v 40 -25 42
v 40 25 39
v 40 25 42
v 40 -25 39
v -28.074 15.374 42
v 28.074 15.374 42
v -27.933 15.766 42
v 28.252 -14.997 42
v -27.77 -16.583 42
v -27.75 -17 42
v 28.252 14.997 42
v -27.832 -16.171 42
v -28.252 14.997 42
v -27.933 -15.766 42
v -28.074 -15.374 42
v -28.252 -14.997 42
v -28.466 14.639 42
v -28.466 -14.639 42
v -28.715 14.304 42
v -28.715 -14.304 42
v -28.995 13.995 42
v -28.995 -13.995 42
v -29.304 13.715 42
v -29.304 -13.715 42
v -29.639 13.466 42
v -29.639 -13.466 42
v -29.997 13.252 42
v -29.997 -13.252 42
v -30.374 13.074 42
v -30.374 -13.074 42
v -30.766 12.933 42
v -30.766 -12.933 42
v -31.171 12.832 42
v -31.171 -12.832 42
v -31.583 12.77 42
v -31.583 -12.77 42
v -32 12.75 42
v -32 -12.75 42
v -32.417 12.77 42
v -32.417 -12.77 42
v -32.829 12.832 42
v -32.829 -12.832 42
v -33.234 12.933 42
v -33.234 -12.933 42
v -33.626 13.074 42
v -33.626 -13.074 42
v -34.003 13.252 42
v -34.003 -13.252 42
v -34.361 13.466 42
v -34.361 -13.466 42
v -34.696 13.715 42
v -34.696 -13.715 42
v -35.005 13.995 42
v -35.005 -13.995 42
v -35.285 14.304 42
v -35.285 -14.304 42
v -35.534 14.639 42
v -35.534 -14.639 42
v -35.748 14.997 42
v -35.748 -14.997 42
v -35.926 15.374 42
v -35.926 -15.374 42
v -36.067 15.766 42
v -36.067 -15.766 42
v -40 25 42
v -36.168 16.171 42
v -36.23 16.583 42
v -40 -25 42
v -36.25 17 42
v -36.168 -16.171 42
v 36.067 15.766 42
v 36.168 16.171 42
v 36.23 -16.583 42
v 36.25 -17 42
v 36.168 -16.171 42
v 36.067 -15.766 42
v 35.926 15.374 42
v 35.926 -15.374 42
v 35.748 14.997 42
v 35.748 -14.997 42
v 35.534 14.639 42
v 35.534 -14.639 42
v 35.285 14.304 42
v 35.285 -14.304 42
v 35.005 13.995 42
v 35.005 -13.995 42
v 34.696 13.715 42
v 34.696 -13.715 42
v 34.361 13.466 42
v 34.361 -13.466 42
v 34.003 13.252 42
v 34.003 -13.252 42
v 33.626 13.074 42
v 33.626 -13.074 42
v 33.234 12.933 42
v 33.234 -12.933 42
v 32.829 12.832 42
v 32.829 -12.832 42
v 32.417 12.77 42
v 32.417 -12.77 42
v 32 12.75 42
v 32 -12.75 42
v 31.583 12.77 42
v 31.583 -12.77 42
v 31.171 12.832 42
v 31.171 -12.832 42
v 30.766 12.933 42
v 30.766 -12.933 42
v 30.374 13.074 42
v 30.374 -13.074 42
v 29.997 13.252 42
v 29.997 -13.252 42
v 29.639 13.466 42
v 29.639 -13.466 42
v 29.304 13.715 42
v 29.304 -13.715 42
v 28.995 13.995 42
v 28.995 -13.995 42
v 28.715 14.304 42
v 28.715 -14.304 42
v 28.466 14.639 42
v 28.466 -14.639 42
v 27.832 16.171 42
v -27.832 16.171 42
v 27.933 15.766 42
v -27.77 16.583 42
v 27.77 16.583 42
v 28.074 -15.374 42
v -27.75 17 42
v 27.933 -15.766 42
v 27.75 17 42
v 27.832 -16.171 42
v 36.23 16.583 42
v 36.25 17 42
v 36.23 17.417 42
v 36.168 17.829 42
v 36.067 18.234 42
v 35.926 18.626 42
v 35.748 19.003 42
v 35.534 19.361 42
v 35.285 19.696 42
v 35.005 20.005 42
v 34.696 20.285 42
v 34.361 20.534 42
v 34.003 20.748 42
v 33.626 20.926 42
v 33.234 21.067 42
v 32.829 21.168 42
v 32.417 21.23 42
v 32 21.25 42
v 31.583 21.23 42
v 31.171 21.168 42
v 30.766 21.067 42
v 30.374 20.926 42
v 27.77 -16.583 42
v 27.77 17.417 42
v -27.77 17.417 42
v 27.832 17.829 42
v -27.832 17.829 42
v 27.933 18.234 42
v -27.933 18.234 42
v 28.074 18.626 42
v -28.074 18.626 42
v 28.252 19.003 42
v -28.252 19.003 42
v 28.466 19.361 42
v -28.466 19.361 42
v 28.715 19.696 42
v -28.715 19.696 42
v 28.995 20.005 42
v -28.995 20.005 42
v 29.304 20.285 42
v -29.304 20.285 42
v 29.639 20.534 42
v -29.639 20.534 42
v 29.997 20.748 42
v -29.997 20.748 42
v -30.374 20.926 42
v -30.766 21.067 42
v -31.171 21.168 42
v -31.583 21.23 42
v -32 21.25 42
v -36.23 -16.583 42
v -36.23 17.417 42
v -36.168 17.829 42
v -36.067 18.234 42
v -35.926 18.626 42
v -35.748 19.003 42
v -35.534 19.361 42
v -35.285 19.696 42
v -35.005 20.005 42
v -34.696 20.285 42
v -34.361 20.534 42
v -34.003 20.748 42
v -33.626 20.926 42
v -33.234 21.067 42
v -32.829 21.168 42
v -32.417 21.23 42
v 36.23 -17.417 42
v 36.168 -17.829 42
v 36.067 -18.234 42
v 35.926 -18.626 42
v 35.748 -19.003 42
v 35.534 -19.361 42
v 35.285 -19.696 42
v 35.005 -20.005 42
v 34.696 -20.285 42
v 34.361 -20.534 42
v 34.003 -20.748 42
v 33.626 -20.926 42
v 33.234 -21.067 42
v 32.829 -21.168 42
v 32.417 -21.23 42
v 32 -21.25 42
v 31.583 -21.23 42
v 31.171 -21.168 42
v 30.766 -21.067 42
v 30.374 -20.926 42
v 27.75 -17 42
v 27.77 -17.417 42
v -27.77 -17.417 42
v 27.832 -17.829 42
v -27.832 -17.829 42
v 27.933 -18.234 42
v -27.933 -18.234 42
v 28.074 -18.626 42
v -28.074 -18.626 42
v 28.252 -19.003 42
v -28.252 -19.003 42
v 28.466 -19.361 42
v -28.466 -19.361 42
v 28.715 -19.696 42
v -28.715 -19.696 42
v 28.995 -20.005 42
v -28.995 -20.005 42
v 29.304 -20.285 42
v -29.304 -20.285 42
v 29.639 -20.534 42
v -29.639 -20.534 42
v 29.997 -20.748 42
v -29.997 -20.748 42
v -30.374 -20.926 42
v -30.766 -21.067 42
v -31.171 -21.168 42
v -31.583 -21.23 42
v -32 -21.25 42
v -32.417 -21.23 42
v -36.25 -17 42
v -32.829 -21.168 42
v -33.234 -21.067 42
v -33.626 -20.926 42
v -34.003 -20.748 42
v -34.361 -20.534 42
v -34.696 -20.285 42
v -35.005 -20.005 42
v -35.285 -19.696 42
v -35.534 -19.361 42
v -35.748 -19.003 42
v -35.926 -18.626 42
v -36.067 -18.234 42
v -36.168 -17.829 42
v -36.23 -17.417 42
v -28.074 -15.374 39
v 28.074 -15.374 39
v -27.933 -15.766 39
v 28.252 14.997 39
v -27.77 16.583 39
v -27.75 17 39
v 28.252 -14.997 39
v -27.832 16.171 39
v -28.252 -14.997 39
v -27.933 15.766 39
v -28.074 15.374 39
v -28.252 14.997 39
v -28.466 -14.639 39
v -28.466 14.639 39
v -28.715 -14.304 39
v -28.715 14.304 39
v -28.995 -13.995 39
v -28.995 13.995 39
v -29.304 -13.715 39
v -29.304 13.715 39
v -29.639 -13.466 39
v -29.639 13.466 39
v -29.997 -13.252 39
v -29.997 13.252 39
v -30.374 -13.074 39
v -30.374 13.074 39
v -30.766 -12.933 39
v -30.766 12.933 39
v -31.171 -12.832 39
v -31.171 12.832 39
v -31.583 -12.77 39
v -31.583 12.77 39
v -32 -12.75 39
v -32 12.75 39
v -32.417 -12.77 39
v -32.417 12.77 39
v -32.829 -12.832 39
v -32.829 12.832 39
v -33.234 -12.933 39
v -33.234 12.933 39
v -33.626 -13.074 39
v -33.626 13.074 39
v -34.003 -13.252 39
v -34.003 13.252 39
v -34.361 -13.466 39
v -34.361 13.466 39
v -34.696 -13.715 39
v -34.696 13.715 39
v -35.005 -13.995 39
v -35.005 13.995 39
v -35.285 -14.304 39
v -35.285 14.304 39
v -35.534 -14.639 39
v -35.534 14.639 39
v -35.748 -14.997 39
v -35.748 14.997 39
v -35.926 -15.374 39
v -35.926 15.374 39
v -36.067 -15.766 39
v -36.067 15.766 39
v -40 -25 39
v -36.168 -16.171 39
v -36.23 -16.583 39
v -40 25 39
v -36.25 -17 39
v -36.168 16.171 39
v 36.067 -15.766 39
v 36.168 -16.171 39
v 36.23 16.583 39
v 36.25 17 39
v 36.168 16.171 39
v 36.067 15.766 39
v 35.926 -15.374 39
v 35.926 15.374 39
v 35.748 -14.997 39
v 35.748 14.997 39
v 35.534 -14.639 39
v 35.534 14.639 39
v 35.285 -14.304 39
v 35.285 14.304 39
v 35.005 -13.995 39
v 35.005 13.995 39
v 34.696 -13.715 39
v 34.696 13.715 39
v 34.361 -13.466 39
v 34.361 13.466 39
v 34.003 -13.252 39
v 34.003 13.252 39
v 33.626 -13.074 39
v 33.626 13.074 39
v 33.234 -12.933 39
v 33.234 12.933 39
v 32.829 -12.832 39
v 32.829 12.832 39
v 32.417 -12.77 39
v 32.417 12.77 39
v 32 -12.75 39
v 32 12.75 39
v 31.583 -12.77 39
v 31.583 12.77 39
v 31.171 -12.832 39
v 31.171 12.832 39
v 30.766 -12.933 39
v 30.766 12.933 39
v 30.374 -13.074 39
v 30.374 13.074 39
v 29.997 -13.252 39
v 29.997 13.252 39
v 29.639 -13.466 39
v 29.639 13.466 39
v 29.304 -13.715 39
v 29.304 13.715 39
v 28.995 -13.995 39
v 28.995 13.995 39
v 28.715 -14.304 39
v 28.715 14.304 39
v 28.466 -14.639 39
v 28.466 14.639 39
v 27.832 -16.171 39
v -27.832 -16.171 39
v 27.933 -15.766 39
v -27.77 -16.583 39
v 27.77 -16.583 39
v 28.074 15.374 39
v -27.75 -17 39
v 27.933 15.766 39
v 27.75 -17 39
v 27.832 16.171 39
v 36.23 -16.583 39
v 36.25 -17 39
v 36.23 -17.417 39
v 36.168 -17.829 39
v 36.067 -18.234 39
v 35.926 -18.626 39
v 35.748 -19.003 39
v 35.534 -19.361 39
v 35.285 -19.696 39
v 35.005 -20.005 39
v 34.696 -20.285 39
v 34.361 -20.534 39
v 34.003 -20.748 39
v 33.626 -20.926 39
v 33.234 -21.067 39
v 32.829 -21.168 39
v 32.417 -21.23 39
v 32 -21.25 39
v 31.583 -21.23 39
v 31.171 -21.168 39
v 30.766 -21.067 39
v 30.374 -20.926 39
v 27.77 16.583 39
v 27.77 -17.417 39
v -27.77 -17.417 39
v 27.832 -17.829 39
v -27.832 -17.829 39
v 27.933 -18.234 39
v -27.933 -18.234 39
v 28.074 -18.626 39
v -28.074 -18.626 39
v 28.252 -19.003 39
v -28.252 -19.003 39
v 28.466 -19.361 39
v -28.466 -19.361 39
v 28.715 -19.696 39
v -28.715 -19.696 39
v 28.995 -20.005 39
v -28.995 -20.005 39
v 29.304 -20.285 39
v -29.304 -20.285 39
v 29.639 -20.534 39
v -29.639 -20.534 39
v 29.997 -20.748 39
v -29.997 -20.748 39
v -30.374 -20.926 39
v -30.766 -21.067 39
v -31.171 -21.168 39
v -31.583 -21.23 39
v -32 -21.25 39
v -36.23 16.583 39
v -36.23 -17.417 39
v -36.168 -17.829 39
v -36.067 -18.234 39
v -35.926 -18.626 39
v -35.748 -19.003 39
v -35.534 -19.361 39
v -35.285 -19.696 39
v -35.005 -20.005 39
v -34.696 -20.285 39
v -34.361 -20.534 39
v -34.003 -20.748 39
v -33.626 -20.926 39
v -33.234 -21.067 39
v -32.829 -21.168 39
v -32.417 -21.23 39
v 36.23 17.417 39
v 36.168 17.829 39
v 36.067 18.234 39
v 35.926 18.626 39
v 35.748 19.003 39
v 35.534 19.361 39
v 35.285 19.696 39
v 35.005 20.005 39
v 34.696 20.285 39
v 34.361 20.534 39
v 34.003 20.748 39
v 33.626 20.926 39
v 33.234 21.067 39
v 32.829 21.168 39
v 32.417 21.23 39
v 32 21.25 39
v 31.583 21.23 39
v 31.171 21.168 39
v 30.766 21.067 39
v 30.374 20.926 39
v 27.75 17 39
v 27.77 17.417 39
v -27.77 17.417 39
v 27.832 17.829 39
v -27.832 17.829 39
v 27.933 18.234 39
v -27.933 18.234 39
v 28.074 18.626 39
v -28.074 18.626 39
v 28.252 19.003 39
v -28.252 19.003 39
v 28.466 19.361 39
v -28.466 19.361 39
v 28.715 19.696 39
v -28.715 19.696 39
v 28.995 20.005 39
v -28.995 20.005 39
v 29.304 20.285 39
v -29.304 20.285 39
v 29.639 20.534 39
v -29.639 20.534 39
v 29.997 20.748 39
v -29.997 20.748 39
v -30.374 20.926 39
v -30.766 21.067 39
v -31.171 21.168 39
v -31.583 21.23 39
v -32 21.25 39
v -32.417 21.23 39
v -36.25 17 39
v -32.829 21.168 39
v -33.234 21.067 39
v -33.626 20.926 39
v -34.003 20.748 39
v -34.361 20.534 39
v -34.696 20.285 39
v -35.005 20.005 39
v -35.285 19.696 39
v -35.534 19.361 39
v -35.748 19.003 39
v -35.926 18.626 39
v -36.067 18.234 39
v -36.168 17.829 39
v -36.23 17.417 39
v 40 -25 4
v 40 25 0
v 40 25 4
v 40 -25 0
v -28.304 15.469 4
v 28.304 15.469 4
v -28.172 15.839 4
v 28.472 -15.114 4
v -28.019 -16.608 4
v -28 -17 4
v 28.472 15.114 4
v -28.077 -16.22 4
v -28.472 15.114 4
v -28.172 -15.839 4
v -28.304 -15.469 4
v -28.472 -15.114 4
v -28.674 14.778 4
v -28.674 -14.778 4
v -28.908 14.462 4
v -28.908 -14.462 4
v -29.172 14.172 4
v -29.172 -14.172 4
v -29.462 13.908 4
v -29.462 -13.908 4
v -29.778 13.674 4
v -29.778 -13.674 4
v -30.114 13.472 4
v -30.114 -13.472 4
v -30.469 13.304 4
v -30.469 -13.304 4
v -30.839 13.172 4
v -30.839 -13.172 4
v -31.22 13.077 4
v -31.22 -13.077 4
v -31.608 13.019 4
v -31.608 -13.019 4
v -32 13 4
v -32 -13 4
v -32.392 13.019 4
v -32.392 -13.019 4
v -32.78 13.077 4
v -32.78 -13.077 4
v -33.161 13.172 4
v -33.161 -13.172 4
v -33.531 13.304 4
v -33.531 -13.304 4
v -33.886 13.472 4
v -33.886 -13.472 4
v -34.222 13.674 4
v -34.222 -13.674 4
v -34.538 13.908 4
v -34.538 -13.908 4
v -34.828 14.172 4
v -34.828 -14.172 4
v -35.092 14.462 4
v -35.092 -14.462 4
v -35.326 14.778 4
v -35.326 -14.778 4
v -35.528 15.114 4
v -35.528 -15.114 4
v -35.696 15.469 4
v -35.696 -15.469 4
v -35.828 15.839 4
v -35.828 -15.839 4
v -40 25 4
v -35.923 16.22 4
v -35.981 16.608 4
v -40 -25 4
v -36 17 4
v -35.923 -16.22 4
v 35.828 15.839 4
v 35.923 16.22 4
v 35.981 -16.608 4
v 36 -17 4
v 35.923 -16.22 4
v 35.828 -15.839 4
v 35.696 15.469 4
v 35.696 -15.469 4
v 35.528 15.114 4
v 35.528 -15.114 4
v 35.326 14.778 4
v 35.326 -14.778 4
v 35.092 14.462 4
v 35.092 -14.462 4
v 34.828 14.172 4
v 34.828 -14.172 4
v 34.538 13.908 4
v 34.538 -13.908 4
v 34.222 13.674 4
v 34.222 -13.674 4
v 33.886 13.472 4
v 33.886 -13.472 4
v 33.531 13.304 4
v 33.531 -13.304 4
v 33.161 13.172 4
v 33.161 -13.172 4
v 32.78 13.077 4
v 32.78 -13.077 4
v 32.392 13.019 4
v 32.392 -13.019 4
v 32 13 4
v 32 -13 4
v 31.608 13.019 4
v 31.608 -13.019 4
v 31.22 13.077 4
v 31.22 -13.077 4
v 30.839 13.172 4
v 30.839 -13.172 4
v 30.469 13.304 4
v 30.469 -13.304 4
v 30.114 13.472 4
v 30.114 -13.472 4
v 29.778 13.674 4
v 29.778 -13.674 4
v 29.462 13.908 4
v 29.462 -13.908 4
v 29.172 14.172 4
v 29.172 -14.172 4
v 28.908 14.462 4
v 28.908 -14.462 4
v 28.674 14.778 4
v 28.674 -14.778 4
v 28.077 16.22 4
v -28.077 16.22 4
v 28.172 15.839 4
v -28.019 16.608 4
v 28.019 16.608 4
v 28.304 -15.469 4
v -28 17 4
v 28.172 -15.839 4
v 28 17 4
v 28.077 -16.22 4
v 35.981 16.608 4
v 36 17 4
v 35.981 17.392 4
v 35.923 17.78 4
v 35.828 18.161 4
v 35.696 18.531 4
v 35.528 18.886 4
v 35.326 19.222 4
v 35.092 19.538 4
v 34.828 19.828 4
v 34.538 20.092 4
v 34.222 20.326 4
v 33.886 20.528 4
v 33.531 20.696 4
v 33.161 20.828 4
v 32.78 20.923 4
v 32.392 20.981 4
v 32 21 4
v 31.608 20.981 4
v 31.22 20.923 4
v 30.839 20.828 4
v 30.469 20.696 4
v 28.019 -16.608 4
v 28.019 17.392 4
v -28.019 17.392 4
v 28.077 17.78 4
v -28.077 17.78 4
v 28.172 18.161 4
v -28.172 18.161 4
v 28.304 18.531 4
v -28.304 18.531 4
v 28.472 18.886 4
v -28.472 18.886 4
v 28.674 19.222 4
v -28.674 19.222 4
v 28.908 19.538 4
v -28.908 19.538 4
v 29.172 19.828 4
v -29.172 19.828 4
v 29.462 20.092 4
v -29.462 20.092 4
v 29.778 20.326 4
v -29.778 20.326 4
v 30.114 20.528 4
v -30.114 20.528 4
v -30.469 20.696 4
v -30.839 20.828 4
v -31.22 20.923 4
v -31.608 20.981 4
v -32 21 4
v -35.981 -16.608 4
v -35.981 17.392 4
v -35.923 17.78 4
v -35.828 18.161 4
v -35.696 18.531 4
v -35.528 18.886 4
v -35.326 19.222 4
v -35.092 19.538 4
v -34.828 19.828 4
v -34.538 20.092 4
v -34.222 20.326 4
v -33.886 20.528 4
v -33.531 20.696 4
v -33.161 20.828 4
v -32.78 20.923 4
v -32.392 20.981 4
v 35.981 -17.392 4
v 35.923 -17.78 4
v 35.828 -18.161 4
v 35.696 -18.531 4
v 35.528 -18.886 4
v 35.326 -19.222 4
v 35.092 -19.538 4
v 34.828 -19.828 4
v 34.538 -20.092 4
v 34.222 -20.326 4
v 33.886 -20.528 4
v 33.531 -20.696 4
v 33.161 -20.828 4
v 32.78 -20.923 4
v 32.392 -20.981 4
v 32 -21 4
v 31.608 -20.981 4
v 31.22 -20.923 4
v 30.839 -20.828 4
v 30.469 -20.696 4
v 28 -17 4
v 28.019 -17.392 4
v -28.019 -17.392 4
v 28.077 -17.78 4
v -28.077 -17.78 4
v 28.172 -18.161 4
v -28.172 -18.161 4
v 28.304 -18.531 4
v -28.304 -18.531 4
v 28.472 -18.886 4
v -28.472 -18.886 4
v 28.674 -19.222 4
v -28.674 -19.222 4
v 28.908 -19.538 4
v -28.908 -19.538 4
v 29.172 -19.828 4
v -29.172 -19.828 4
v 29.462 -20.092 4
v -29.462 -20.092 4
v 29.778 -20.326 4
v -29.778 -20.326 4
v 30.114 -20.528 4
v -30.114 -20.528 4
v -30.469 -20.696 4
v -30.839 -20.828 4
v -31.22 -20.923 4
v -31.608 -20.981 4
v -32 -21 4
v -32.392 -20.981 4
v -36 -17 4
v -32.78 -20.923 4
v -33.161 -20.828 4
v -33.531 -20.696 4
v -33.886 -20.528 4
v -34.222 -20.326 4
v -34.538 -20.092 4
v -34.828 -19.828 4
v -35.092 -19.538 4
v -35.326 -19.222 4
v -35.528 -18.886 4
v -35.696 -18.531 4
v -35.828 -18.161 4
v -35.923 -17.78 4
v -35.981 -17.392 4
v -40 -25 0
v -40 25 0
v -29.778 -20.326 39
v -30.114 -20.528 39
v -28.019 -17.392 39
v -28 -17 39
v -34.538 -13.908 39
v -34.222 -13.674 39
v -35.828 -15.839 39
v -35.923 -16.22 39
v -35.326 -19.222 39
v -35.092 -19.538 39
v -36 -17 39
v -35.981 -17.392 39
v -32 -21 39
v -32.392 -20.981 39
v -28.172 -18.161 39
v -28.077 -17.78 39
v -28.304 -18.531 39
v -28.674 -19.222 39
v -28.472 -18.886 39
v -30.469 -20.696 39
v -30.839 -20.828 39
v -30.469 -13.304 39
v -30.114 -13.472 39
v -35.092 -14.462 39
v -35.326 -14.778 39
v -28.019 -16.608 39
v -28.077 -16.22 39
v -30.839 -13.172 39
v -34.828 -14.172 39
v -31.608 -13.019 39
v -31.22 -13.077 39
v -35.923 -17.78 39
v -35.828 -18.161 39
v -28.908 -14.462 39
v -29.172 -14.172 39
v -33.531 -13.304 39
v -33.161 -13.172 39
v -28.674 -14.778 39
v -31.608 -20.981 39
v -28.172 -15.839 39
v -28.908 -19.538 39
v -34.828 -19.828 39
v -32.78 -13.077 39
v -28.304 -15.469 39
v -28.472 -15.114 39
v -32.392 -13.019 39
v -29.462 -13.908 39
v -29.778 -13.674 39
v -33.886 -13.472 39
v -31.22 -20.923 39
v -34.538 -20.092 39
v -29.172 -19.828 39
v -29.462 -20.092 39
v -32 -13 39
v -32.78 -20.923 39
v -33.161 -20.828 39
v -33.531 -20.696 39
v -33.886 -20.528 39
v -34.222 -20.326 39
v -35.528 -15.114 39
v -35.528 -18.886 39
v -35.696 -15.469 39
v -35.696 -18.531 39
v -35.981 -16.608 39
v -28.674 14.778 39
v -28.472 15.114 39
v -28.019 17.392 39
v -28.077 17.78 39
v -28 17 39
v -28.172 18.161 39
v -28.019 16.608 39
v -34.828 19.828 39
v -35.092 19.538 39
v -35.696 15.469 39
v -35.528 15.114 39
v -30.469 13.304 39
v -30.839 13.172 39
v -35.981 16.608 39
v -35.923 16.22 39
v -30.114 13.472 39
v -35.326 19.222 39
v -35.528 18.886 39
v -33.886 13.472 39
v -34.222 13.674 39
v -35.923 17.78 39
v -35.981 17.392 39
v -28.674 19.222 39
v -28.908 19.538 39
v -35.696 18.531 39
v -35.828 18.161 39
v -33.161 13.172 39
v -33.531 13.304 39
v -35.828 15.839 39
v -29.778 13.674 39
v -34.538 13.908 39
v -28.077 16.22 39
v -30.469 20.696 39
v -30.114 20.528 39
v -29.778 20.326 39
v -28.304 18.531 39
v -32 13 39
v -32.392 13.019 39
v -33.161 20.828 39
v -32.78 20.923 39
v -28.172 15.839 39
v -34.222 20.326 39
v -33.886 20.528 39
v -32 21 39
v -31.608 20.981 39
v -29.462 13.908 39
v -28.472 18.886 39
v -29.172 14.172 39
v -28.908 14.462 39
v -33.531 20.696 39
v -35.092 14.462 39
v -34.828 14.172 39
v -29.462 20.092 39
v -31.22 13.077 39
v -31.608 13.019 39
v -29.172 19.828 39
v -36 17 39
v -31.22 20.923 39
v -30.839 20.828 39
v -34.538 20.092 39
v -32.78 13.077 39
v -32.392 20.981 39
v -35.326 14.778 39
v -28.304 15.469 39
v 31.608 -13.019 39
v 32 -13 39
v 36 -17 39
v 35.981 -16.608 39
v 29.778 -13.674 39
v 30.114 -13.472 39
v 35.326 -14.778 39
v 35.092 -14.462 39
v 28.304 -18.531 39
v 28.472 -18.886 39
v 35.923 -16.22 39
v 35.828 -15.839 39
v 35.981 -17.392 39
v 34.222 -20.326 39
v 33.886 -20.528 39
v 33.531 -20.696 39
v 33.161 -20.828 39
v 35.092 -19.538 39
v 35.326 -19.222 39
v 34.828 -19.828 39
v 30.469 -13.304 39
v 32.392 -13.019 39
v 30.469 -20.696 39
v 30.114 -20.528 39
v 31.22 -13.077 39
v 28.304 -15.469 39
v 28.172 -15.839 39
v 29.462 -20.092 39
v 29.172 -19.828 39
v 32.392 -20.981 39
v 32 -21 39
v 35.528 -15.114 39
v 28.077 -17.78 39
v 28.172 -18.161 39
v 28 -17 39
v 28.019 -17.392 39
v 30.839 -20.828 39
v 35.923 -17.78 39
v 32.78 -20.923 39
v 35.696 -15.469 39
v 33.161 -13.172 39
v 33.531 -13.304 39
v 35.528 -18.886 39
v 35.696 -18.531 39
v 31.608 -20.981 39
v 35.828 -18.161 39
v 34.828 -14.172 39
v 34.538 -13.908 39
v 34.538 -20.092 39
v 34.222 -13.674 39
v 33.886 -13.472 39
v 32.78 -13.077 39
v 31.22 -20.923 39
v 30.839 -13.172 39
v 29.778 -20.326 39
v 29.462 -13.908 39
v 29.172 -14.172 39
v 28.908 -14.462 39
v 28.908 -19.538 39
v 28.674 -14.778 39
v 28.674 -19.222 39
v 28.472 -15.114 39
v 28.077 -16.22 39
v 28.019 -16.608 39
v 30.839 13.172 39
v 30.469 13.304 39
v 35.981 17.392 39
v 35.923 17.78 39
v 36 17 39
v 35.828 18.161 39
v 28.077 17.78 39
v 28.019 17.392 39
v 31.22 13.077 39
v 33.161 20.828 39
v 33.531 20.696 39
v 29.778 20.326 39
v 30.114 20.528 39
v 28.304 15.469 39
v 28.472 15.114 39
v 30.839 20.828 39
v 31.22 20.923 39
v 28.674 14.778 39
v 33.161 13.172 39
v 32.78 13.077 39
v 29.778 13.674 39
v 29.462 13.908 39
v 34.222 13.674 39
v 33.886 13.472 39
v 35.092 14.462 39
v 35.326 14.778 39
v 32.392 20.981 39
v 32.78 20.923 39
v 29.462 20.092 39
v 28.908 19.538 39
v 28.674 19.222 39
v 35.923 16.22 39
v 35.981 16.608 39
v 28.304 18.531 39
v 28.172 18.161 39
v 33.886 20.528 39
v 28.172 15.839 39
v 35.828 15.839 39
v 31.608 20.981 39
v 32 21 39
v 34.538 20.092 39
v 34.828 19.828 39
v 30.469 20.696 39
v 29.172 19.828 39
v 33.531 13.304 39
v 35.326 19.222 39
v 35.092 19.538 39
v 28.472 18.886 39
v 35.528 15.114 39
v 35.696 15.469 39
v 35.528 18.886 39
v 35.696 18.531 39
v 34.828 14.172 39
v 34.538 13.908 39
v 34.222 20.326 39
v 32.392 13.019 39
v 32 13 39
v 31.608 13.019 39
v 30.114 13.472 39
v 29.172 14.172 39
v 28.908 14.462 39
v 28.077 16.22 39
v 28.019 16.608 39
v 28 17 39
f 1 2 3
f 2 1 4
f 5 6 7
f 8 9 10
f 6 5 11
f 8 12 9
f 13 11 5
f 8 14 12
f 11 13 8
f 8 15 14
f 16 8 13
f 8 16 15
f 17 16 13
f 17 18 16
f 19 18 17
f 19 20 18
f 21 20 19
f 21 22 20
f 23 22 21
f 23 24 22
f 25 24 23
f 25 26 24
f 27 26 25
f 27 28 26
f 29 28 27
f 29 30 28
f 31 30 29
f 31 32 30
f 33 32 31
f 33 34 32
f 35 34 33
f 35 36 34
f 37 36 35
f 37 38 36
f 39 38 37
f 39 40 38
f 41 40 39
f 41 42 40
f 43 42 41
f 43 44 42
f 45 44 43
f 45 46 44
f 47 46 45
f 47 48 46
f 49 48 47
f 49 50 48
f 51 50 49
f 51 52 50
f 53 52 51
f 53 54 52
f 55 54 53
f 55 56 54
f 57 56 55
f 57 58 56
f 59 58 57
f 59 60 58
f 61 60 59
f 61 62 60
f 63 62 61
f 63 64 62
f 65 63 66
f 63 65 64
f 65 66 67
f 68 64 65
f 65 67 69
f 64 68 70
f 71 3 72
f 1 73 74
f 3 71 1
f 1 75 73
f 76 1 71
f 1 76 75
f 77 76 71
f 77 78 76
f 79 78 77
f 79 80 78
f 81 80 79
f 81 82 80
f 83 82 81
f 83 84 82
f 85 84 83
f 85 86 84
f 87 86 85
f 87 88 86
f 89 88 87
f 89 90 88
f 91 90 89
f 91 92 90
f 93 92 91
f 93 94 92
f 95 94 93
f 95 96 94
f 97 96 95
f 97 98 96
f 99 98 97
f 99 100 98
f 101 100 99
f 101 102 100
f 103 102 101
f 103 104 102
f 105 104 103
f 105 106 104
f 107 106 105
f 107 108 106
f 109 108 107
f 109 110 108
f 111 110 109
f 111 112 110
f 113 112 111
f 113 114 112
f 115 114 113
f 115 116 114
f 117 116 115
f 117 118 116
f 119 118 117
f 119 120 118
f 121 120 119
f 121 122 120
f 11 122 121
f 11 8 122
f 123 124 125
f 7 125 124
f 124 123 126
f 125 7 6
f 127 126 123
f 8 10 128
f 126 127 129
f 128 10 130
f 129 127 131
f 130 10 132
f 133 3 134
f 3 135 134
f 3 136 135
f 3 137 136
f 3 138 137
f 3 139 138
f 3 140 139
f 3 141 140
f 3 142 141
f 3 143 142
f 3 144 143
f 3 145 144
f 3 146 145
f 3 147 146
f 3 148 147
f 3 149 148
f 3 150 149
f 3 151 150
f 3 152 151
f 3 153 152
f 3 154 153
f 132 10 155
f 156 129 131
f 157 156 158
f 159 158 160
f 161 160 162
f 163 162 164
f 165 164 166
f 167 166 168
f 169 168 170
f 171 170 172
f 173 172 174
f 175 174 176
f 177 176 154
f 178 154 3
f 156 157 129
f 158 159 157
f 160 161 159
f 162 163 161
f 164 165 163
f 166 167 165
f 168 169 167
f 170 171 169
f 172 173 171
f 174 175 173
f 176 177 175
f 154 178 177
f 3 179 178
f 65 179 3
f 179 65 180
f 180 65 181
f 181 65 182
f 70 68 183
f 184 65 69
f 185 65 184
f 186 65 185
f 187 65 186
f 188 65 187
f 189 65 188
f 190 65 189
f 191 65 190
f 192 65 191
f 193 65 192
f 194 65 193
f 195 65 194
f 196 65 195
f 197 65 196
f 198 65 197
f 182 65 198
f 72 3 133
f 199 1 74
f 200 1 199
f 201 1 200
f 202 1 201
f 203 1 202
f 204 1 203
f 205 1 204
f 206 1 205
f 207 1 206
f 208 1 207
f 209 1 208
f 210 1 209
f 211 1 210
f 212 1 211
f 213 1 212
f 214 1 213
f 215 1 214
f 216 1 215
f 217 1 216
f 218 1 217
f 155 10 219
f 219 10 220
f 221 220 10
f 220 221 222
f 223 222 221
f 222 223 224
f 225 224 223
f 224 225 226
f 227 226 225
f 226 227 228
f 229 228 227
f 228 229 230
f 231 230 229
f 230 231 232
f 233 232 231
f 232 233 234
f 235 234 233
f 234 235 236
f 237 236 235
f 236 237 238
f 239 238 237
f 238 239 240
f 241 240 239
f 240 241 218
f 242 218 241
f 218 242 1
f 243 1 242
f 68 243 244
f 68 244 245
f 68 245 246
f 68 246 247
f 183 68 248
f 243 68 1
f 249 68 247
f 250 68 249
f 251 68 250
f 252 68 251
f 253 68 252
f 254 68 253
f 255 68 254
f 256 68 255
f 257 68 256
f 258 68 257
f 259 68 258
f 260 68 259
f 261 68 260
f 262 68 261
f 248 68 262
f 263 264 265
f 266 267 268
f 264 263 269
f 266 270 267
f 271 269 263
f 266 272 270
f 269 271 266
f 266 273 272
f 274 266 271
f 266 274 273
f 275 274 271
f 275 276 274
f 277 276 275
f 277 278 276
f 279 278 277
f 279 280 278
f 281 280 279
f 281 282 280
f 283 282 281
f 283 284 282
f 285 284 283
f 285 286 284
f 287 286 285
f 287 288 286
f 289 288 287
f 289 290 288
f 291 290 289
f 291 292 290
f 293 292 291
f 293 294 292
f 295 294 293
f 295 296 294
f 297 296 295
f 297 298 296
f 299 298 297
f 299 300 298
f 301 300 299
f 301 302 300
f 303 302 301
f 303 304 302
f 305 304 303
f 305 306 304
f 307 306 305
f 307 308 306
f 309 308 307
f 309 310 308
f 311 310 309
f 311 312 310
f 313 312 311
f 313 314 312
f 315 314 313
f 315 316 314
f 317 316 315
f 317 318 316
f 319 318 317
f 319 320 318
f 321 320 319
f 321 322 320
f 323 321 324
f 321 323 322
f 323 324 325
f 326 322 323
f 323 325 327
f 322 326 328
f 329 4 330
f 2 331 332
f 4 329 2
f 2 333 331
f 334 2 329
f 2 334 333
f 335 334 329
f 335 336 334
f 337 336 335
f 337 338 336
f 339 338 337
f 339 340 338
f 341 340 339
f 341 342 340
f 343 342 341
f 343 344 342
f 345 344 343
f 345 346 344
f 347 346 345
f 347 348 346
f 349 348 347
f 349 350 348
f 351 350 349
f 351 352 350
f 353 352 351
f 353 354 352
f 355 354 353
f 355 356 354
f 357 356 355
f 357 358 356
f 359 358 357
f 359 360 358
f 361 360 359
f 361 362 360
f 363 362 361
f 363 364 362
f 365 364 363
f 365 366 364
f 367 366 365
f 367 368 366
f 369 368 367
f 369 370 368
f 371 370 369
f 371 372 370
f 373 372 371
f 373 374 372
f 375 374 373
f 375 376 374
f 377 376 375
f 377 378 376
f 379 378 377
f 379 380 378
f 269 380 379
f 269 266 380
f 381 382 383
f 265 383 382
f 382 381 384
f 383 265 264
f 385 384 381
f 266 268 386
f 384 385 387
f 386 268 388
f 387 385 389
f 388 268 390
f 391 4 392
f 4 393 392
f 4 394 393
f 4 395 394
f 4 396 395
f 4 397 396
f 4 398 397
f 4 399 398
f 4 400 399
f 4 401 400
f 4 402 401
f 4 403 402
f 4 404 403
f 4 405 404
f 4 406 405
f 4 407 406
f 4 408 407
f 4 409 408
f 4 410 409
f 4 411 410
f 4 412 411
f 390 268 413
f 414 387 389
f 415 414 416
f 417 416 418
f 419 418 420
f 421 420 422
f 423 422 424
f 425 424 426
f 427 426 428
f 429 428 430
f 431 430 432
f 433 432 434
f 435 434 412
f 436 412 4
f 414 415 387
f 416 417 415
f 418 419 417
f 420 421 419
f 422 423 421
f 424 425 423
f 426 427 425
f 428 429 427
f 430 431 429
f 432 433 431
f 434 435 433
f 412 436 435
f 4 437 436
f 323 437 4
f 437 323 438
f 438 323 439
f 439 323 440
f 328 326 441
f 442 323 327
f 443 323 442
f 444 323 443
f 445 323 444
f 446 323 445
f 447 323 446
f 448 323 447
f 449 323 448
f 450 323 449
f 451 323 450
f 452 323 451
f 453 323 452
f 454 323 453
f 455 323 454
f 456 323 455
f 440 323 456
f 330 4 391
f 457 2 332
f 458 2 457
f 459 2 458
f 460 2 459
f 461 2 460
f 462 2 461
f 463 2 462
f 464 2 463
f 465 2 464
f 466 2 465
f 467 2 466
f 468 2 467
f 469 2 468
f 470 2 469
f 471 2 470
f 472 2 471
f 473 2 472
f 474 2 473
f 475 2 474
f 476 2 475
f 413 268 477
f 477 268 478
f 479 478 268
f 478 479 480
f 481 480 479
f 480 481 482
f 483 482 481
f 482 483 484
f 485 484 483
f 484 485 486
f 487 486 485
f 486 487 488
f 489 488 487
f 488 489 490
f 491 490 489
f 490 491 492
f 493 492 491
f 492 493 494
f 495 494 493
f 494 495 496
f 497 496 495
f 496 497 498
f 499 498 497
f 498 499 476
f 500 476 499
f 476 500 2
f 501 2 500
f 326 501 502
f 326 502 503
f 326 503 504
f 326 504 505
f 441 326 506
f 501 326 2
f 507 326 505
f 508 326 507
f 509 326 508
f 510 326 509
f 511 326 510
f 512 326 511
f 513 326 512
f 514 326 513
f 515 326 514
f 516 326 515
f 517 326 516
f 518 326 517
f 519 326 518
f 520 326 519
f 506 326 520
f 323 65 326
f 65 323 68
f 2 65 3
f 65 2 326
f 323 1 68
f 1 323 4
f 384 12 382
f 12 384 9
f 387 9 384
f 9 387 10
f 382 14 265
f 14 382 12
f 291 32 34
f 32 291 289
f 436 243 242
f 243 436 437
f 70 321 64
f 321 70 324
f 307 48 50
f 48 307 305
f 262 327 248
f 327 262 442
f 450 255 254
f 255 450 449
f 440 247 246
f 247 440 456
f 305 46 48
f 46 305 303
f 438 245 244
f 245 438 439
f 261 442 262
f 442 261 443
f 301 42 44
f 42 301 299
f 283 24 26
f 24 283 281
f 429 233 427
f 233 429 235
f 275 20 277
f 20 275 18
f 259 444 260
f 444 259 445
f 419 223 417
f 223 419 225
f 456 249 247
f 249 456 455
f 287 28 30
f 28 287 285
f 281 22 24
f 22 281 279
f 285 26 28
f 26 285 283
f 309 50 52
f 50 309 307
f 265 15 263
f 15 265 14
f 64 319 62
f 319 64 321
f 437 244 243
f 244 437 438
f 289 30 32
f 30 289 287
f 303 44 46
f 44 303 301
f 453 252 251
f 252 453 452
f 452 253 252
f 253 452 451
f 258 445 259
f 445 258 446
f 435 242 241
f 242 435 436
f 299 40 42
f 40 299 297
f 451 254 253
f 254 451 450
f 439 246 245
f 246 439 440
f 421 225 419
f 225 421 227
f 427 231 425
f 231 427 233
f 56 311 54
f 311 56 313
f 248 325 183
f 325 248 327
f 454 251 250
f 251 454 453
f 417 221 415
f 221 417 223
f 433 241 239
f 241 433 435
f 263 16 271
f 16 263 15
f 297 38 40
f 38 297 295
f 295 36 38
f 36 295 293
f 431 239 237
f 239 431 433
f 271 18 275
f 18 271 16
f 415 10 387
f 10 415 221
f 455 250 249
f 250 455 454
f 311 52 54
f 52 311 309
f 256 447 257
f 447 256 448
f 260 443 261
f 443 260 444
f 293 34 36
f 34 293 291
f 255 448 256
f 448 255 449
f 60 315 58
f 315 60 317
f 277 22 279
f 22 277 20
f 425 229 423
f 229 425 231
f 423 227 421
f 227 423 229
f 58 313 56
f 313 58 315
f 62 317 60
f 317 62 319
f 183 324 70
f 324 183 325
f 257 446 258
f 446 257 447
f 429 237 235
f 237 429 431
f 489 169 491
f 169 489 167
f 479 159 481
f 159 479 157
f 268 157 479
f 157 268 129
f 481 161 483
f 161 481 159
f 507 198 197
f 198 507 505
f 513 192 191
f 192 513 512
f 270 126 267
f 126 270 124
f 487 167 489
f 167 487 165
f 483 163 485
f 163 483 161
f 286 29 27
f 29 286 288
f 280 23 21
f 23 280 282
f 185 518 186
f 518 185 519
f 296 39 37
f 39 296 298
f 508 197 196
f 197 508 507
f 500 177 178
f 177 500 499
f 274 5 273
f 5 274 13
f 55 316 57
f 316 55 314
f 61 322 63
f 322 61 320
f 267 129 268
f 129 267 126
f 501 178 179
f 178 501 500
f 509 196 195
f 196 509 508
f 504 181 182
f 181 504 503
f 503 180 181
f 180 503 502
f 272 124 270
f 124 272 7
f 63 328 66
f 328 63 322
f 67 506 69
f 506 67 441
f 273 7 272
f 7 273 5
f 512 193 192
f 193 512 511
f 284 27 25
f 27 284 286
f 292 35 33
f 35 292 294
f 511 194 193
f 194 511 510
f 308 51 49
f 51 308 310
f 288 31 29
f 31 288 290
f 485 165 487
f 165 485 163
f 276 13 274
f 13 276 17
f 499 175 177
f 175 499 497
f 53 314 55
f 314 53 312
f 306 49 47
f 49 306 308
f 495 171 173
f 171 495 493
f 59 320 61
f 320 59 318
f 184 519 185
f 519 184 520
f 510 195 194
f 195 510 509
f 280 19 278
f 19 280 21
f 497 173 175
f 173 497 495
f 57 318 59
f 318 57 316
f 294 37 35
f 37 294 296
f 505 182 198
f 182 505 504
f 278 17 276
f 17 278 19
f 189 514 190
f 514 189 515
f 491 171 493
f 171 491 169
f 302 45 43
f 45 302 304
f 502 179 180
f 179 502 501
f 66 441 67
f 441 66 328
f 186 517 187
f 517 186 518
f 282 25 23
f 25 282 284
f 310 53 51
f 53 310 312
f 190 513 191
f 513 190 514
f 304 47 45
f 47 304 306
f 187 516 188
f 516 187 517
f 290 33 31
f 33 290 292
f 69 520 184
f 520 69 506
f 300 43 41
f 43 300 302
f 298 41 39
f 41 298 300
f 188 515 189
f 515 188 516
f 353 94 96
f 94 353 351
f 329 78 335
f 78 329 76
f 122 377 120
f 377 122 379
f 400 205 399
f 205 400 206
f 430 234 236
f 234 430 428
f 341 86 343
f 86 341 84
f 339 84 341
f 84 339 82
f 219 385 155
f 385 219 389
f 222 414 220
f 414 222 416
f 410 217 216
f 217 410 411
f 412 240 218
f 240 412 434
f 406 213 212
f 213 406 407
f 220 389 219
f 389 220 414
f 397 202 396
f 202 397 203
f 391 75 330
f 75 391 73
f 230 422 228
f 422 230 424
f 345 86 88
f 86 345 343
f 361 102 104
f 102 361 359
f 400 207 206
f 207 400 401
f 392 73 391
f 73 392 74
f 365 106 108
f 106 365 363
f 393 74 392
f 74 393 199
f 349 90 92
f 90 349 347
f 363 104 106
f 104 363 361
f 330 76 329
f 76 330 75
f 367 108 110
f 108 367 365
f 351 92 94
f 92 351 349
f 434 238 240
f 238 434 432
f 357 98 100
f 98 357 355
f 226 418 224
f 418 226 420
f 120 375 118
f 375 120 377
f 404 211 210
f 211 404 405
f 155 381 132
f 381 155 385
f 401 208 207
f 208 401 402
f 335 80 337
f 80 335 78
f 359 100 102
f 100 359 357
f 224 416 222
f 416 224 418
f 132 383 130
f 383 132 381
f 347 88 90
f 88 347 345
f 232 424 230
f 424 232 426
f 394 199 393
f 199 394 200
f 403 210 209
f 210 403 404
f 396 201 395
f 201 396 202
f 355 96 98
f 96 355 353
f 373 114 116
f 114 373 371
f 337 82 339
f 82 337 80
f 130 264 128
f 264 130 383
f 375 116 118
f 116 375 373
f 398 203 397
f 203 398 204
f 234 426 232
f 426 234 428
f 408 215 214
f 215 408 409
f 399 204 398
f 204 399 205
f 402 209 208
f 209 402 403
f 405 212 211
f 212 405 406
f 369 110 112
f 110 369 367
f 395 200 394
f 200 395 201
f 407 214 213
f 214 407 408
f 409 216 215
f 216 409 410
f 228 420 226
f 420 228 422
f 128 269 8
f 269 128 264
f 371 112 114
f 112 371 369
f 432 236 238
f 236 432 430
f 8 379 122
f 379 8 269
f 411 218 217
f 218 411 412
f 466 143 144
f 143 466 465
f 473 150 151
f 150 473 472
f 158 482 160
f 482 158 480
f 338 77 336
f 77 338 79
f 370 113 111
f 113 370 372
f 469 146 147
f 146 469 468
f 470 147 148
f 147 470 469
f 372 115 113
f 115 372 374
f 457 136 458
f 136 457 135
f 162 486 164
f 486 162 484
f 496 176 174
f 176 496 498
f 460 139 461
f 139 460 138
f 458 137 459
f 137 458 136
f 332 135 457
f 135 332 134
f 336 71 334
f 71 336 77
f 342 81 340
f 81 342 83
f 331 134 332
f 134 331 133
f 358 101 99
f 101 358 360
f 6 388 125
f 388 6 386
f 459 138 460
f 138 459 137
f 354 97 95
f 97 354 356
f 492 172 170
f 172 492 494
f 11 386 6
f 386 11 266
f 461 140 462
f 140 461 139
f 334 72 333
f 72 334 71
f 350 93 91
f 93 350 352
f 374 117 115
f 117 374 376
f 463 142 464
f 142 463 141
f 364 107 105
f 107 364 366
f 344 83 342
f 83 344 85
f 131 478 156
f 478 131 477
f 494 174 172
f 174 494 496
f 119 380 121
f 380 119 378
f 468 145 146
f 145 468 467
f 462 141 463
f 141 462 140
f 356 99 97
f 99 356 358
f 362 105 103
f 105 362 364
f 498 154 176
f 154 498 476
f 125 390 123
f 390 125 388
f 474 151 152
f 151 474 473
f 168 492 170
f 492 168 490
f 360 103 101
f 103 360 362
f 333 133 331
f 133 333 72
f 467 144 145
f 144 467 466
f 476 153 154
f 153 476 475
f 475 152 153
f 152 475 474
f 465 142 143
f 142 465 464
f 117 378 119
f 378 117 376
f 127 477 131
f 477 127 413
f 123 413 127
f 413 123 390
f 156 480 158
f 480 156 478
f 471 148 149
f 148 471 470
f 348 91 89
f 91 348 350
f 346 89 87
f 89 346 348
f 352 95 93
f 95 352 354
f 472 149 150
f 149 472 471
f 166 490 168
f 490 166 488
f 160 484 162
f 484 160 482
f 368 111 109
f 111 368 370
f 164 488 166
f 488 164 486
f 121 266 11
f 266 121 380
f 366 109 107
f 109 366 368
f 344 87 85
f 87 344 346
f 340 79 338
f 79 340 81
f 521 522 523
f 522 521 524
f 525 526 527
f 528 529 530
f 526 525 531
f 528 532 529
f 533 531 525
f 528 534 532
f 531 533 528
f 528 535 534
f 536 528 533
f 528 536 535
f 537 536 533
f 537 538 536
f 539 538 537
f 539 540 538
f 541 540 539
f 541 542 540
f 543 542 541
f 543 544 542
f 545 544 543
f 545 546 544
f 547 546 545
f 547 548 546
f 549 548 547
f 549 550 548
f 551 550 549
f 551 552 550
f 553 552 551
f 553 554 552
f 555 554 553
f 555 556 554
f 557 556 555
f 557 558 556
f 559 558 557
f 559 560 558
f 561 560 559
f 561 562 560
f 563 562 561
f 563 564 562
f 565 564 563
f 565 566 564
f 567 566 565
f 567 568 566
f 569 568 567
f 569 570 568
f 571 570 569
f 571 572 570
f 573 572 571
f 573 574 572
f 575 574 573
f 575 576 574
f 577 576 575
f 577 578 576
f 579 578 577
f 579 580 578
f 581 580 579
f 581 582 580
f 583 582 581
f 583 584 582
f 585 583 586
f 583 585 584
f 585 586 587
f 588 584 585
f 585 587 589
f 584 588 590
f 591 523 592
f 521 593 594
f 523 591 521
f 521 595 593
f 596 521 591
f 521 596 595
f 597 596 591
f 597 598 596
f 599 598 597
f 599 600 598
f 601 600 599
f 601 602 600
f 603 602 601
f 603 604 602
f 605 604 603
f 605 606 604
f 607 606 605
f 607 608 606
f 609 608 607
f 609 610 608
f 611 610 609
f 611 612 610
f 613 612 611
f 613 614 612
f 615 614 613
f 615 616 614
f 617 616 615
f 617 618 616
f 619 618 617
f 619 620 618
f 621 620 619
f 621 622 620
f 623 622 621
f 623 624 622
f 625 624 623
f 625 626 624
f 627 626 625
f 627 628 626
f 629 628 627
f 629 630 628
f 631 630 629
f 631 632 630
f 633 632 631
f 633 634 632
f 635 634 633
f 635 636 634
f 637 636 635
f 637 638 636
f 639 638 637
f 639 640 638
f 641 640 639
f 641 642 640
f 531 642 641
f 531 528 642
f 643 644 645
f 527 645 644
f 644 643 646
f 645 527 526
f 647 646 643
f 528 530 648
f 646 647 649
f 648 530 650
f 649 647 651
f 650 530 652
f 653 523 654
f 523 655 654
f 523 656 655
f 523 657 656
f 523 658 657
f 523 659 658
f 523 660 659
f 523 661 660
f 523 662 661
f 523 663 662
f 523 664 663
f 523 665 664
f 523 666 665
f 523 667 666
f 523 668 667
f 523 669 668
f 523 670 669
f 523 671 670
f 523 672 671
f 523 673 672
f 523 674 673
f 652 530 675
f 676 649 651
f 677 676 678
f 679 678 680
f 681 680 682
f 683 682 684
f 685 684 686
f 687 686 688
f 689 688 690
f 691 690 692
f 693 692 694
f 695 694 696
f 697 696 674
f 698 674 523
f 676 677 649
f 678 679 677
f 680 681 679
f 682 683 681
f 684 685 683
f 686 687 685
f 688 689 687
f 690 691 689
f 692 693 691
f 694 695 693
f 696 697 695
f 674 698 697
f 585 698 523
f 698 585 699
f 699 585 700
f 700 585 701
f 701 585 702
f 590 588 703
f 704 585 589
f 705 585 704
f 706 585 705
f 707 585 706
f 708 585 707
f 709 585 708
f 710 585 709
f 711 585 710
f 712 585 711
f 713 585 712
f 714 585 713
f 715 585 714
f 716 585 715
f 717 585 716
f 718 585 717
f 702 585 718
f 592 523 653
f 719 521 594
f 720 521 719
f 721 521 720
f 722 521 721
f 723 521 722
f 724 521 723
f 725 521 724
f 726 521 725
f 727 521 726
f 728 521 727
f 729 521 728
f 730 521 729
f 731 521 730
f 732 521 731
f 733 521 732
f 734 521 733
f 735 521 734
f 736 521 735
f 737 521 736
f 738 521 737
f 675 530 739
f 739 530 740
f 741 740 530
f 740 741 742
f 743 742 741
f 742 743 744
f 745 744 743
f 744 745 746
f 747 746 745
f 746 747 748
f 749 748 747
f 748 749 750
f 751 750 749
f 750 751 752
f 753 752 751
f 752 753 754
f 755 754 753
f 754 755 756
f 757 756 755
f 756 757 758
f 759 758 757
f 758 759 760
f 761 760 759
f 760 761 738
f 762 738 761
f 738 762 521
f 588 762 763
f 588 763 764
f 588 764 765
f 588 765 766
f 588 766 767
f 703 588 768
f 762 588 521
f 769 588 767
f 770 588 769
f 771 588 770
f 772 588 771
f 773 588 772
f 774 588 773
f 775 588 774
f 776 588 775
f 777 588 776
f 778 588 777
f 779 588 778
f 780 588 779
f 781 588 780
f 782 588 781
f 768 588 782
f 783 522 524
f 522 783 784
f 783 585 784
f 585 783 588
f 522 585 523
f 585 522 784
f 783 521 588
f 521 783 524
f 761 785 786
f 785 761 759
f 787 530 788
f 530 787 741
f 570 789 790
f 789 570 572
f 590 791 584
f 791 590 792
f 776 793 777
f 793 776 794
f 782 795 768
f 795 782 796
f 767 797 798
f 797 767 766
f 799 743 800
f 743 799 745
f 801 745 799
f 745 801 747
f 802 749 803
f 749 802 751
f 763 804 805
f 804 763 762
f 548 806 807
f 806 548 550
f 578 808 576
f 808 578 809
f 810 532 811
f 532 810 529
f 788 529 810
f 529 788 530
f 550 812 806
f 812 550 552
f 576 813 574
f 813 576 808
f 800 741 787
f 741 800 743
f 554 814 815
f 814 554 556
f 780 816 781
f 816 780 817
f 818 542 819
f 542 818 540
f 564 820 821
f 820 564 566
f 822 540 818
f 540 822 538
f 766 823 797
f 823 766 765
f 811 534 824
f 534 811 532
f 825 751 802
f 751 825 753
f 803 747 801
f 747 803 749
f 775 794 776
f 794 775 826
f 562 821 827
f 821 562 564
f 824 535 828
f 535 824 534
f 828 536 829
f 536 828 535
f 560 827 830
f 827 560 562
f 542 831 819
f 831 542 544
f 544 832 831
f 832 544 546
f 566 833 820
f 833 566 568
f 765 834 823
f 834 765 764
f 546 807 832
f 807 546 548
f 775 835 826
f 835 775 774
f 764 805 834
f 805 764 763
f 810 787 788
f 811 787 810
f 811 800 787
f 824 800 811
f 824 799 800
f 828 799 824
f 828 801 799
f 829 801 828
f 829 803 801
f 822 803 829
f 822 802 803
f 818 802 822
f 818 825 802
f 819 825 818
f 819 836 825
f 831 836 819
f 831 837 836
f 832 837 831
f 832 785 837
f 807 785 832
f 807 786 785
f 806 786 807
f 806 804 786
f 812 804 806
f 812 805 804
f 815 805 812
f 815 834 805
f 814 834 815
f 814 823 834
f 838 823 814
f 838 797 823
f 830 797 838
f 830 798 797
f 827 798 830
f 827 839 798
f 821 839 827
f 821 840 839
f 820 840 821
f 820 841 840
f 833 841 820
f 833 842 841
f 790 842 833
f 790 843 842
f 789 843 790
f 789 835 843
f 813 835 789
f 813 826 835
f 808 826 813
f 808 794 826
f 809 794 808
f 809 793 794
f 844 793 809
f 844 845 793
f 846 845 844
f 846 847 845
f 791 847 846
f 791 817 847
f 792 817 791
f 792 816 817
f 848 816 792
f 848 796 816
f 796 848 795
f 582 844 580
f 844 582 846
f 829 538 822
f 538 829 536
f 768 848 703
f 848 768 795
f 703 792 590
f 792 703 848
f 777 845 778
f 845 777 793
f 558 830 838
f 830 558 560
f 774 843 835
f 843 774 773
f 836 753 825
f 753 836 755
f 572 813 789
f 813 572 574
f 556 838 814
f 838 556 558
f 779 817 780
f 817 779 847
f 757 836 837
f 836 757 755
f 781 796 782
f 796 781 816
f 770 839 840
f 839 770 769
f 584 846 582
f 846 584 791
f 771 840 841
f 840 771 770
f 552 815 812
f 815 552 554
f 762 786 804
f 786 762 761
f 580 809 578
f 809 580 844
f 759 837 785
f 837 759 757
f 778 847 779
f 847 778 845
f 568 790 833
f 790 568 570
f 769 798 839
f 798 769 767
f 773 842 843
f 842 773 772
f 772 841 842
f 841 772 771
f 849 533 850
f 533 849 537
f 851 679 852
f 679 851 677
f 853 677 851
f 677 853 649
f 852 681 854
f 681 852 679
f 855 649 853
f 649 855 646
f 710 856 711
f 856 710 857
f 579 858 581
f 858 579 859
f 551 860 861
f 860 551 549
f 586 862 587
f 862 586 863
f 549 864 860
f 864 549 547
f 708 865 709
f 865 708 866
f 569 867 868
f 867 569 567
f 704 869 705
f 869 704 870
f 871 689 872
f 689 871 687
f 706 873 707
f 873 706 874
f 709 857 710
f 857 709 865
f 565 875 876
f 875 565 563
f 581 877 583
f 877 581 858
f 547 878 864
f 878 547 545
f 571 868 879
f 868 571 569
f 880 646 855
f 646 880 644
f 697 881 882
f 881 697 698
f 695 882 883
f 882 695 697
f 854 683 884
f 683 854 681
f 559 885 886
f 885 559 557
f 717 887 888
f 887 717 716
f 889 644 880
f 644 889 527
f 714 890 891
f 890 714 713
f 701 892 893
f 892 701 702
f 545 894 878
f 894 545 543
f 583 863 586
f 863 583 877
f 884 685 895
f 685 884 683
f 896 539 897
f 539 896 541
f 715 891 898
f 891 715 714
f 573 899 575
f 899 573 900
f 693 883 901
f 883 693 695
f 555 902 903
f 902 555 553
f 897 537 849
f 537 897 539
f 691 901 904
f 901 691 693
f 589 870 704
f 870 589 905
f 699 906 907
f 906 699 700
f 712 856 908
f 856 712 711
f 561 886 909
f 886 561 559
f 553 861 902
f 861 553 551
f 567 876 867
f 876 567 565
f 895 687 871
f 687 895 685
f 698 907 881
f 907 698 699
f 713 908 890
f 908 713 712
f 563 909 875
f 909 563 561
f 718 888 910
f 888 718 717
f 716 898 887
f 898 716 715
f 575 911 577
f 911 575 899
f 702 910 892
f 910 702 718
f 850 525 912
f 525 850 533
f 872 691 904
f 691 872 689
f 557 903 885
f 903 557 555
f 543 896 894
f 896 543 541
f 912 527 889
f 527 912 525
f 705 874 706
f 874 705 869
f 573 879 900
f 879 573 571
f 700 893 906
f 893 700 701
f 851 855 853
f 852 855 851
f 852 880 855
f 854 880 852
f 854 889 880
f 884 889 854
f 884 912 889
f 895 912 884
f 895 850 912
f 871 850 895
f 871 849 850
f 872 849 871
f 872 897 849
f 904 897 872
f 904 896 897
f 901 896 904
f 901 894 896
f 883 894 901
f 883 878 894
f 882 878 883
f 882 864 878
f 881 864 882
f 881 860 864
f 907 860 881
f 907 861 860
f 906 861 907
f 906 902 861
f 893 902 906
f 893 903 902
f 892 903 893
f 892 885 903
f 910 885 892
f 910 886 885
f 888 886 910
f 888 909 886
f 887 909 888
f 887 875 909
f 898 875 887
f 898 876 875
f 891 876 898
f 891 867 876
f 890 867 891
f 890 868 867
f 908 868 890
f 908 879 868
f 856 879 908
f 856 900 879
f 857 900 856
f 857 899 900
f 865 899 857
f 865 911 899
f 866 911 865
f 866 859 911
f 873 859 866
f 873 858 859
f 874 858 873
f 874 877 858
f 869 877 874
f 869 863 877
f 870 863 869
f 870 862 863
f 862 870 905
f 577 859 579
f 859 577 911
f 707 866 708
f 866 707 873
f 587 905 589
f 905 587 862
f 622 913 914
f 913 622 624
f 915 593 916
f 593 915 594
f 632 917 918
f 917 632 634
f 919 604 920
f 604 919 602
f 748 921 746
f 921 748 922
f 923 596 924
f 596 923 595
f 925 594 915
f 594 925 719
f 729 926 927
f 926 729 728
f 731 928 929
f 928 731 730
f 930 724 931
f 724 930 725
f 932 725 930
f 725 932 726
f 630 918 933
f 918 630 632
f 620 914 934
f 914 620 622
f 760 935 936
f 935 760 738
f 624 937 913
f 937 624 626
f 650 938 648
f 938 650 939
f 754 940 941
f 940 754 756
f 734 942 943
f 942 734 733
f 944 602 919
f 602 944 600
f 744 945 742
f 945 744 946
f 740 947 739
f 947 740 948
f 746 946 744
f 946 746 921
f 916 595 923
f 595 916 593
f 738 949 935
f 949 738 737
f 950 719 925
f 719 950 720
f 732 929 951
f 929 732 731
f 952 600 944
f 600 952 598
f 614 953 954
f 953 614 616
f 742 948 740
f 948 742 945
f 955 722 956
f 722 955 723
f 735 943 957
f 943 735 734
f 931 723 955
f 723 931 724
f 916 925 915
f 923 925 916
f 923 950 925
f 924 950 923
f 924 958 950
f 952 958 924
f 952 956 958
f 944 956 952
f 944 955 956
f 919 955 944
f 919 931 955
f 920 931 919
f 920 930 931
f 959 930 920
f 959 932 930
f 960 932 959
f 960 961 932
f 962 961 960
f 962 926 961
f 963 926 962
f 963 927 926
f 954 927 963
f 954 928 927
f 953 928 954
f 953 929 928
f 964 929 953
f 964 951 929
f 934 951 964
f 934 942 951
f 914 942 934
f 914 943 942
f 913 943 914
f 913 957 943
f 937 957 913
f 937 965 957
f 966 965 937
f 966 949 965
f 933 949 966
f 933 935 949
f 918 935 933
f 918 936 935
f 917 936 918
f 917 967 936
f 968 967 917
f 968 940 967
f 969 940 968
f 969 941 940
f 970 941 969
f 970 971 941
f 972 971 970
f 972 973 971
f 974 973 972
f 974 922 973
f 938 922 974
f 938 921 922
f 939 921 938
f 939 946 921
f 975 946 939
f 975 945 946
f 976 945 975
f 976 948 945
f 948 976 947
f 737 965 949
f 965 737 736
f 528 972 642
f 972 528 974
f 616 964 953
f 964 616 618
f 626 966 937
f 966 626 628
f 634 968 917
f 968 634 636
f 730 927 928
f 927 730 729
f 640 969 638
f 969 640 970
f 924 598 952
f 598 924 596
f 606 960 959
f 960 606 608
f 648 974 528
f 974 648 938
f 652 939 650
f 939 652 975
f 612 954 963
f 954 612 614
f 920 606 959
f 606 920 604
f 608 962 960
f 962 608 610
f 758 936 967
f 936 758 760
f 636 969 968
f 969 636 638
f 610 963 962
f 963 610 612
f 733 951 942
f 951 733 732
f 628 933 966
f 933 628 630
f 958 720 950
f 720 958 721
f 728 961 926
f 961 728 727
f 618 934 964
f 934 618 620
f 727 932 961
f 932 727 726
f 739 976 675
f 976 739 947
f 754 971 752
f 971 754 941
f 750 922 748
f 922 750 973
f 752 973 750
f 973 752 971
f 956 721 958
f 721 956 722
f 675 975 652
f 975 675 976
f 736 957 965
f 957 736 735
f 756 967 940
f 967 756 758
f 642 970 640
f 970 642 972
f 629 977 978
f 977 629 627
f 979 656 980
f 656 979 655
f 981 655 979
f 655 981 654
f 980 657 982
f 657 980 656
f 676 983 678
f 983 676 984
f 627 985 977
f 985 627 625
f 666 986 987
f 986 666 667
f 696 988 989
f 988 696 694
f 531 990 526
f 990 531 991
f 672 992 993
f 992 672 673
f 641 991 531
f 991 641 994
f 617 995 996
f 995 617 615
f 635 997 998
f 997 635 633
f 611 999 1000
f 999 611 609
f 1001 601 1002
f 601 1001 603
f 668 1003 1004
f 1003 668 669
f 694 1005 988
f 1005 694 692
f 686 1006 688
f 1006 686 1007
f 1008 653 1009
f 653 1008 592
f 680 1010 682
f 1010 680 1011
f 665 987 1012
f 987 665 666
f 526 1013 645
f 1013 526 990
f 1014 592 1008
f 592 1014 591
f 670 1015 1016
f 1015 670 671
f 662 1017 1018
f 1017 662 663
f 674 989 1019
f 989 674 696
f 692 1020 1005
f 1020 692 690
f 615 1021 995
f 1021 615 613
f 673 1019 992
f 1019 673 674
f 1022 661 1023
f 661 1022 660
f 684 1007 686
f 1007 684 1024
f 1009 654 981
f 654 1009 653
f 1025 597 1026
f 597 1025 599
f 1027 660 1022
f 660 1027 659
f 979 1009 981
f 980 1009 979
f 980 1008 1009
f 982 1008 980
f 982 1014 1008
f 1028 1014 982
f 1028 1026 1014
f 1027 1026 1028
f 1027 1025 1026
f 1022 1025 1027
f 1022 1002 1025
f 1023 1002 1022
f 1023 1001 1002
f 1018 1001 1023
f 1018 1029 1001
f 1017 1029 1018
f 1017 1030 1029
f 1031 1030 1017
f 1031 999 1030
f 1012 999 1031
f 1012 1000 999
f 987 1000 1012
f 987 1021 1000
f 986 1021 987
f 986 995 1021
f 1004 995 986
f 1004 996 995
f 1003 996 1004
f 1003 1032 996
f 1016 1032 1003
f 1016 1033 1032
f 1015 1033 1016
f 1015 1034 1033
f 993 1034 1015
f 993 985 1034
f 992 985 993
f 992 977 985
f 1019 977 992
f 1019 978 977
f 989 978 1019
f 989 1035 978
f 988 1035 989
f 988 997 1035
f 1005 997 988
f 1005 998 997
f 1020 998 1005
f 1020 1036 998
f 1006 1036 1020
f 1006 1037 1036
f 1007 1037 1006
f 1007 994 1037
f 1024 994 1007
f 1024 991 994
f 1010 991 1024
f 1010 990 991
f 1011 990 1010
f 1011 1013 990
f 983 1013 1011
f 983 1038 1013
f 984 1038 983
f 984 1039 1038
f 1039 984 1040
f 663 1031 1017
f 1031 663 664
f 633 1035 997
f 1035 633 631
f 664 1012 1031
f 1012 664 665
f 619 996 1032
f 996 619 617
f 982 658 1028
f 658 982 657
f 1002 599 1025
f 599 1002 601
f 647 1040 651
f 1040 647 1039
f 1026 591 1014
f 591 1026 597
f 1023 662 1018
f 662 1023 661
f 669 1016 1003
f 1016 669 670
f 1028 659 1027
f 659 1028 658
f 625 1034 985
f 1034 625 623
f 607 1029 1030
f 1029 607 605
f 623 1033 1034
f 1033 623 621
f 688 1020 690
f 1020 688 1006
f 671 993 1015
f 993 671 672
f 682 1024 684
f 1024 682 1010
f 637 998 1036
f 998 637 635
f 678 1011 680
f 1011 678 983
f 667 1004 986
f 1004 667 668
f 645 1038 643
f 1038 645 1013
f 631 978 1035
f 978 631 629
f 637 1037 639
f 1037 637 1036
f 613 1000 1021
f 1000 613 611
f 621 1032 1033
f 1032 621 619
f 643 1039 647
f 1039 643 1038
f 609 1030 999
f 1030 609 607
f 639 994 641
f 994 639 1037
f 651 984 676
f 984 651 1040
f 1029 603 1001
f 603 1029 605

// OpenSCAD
// Generated with SolidPython2 for OpenSCAD task-020
$fn = 64;

union() {
	translate(v = [-40.0, -25.0, 0]) {
		cube(size = [80, 50, 4]);
	}
	translate(v = [-32, -17, 4]) {
		cylinder(h = 35, r = 4);
	}
	translate(v = [-32, 17, 4]) {
		cylinder(h = 35, r = 4);
	}
	translate(v = [32, -17, 4]) {
		cylinder(h = 35, r = 4);
	}
	translate(v = [32, 17, 4]) {
		cylinder(h = 35, r = 4);
	}
	difference() {
		translate(v = [-40.0, -25.0, 39]) {
			cube(size = [80, 50, 3]);
		}
		translate(v = [-32, -17, 38]) {
			cylinder(h = 5, r = 4.25);
		}
		translate(v = [-32, 17, 38]) {
			cylinder(h = 5, r = 4.25);
		}
		translate(v = [32, -17, 38]) {
			cylinder(h = 5, r = 4.25);
		}
		translate(v = [32, 17, 38]) {
			cylinder(h = 5, r = 4.25);
		}
	}
}
